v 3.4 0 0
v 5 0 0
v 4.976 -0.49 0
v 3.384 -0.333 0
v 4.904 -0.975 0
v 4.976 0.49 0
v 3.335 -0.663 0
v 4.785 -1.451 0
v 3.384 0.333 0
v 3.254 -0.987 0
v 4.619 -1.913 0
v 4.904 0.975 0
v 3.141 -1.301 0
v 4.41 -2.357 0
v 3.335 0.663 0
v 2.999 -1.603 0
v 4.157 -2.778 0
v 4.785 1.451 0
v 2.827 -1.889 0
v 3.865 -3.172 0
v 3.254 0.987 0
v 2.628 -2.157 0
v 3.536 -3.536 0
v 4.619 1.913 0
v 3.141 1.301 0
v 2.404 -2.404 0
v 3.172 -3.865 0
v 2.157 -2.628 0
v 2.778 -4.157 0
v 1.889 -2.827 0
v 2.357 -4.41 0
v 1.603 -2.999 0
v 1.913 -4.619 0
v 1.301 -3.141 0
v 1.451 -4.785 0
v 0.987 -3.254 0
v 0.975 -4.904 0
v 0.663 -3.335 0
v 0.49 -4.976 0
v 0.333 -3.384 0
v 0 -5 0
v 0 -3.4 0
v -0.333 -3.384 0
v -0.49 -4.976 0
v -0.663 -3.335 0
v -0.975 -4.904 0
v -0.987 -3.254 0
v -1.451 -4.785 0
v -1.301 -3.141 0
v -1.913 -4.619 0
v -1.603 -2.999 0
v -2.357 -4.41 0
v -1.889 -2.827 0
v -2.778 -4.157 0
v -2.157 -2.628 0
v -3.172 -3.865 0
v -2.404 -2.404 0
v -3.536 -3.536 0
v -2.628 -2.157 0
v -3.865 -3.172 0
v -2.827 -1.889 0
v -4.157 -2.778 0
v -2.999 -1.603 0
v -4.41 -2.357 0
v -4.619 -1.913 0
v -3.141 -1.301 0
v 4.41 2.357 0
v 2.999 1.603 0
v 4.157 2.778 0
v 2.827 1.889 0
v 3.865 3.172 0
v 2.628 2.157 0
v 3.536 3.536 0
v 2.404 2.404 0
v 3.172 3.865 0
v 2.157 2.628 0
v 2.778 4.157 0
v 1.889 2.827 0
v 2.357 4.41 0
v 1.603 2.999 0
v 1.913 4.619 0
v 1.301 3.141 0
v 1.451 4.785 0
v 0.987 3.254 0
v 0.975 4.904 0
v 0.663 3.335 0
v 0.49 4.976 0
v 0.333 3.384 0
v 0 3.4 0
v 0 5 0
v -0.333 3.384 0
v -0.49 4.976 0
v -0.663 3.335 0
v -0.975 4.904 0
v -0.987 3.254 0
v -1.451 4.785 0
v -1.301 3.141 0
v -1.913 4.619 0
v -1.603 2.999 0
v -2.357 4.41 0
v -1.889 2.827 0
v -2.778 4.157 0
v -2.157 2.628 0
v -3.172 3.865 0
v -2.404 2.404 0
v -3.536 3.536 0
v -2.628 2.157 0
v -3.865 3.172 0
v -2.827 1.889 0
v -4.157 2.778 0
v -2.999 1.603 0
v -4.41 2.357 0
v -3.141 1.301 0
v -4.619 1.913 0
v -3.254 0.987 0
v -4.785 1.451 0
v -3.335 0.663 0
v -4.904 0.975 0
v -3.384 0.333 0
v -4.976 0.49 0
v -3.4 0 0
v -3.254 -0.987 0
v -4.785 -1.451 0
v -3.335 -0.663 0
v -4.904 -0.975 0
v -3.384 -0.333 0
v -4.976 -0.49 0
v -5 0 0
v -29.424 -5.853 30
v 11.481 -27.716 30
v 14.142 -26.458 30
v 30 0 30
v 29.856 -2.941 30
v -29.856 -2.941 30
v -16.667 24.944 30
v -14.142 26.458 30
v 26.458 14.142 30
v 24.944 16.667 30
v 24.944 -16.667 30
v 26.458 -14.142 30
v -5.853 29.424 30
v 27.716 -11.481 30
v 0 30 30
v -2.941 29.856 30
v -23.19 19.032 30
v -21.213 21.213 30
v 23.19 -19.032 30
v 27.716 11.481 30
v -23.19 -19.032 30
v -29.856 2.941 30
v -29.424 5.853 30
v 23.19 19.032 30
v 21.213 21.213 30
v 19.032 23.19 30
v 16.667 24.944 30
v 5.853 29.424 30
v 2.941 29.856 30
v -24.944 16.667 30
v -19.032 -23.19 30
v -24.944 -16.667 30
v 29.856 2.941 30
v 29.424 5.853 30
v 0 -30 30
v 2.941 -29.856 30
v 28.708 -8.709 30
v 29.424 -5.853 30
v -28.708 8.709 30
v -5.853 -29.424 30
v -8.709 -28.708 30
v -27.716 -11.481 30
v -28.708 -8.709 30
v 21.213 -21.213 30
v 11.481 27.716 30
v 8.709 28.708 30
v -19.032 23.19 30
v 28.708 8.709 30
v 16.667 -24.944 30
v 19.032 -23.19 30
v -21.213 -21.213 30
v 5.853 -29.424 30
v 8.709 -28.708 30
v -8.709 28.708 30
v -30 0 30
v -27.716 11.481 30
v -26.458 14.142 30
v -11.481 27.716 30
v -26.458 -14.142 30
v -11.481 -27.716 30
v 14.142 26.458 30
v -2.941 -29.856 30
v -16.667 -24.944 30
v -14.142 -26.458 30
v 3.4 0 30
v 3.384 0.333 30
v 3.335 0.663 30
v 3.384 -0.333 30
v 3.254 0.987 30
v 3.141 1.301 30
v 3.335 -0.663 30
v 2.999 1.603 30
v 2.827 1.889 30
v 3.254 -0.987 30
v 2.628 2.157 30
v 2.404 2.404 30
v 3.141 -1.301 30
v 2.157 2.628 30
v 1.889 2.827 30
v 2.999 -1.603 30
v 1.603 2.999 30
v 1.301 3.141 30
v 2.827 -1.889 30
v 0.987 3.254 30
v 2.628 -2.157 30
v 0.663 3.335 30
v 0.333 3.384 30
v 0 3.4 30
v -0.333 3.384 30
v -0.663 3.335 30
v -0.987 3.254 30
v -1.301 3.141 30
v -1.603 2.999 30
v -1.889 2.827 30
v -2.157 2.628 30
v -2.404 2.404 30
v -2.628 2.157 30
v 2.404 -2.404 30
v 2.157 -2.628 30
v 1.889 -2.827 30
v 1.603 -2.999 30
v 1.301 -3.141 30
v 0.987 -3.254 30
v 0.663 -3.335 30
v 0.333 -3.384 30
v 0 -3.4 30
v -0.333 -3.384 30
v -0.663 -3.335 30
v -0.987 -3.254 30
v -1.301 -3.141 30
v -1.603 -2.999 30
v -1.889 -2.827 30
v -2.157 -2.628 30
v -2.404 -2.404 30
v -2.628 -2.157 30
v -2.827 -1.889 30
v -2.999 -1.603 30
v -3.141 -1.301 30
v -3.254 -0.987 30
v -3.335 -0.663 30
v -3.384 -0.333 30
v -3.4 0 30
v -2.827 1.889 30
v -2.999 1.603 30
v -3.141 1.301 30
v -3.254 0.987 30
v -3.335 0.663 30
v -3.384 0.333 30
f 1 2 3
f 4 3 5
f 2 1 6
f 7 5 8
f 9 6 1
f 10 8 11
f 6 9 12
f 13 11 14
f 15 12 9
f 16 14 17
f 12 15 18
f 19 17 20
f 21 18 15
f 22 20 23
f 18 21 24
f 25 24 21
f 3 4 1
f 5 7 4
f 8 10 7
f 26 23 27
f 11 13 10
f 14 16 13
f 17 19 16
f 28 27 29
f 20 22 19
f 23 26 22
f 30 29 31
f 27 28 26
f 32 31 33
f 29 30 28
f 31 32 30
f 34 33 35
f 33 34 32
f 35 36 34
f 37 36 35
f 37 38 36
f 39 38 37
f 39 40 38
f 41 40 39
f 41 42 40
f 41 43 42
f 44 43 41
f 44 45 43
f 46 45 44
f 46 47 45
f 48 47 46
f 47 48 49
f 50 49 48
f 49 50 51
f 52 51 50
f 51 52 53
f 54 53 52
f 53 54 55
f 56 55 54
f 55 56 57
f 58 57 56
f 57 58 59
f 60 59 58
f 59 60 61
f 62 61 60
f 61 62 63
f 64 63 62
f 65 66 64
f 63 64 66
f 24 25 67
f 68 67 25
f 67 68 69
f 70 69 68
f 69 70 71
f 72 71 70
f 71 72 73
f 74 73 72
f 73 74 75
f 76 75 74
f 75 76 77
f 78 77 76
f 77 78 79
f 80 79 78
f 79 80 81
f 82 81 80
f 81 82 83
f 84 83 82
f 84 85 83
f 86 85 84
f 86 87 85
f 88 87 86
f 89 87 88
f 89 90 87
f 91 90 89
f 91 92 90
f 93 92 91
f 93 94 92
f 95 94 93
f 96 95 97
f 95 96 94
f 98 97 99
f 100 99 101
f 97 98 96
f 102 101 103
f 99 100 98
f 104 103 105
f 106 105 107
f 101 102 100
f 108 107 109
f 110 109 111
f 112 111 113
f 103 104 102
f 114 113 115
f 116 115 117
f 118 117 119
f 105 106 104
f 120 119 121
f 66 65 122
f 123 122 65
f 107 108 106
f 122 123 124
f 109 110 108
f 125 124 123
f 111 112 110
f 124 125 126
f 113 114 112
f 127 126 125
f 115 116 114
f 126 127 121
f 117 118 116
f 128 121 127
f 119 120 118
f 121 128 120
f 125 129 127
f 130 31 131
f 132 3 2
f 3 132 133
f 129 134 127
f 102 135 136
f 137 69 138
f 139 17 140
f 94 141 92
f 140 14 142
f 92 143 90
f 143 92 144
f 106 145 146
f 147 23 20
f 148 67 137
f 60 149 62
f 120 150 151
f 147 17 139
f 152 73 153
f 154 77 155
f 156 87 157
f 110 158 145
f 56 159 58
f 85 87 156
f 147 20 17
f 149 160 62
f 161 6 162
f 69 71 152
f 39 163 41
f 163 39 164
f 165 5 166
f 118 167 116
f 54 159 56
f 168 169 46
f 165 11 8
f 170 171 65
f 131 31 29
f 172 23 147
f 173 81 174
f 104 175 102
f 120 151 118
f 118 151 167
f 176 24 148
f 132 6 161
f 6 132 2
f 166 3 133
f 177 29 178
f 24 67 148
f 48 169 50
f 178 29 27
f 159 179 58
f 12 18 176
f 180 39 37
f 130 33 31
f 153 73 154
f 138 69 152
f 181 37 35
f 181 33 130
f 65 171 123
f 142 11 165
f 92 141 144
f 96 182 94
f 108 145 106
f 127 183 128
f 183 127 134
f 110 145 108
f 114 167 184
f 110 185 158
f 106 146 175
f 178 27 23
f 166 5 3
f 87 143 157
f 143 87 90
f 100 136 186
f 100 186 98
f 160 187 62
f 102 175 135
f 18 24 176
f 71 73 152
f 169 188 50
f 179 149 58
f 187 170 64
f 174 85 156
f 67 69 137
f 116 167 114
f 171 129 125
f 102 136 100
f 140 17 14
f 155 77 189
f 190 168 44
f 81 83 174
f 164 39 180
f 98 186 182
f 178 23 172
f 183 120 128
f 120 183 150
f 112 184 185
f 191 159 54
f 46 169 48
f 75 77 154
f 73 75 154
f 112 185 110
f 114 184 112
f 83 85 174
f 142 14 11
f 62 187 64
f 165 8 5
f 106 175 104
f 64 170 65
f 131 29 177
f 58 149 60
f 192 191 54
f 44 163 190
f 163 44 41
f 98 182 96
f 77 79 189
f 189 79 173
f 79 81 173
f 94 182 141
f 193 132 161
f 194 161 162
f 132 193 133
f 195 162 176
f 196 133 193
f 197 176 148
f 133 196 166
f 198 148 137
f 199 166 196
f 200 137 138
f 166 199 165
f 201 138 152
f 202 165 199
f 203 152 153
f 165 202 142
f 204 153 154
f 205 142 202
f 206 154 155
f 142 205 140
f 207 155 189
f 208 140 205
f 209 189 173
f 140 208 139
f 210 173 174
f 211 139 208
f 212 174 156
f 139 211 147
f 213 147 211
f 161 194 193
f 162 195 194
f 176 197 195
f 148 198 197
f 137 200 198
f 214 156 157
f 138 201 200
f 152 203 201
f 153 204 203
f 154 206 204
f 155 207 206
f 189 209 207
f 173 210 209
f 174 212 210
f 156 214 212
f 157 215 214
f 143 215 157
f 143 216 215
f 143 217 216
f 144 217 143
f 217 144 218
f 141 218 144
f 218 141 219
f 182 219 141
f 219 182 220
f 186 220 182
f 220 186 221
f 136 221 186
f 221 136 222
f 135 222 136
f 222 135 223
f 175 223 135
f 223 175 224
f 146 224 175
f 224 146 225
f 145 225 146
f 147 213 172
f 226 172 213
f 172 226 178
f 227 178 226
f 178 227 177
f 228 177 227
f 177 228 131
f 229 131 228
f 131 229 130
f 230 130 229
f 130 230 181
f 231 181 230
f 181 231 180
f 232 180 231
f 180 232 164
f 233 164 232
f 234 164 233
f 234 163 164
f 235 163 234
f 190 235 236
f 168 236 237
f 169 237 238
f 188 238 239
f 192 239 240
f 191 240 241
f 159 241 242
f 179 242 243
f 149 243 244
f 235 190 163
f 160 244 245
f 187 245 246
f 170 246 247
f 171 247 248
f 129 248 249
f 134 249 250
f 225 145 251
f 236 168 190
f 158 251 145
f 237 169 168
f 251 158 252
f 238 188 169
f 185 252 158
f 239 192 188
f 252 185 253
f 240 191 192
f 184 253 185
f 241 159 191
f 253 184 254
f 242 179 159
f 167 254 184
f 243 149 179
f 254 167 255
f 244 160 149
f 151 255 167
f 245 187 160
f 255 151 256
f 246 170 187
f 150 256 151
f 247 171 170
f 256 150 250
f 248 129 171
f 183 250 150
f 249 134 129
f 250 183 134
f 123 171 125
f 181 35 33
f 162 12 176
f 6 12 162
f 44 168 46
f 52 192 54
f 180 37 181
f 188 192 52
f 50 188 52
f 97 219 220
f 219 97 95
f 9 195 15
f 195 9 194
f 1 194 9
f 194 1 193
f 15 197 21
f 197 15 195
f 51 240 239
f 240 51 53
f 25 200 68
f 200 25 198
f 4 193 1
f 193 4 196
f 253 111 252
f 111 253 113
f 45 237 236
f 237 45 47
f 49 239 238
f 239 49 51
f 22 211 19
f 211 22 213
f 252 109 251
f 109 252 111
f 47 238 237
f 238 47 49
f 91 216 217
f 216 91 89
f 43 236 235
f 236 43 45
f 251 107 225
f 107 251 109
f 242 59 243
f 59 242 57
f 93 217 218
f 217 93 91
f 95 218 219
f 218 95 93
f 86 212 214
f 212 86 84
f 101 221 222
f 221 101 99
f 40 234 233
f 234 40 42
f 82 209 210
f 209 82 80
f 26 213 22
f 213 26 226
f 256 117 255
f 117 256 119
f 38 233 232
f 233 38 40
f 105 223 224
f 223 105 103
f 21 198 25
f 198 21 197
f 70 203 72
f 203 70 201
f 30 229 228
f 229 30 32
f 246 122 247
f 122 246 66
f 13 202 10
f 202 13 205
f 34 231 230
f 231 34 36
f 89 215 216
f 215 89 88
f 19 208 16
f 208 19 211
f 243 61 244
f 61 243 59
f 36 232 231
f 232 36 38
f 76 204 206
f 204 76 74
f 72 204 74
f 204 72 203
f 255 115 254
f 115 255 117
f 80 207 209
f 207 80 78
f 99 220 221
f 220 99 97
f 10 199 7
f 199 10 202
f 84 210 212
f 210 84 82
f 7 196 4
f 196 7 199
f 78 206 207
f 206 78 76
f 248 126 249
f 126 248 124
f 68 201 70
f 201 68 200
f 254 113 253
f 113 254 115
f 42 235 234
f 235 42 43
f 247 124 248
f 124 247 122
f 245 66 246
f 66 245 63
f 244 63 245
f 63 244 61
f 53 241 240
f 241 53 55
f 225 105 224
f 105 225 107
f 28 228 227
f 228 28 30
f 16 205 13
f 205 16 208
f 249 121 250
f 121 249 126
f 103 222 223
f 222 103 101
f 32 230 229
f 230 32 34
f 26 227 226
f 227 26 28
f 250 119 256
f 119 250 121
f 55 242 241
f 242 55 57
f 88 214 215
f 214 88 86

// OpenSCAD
// Funnel - printed upright, open at top and bottom
// Units: mm

$fn = 64;

// Spout
spout_d      = 10;    // outer diameter
spout_bore   = 6.8;   // bore diameter (wall 1.6)
spout_h      = 20;    // length

// Cone
cone_top_d   = 60;    // rim diameter
cone_h       = 30;    // height from z = 20 to rim

// Cut clearance
eps          = 0.5;   // extension past faces

difference() {
    union() {
        // Spout
        cylinder(d = spout_d, h = spout_h);
        // Cone
        cylinder(d1 = spout_d, d2 = cone_top_d, h = cone_h);
    }
    // Through-bore
    translate([0, 0, -eps])
        cylinder(d = spout_bore, h = spout_h + cone_h + 2 * eps);
}
